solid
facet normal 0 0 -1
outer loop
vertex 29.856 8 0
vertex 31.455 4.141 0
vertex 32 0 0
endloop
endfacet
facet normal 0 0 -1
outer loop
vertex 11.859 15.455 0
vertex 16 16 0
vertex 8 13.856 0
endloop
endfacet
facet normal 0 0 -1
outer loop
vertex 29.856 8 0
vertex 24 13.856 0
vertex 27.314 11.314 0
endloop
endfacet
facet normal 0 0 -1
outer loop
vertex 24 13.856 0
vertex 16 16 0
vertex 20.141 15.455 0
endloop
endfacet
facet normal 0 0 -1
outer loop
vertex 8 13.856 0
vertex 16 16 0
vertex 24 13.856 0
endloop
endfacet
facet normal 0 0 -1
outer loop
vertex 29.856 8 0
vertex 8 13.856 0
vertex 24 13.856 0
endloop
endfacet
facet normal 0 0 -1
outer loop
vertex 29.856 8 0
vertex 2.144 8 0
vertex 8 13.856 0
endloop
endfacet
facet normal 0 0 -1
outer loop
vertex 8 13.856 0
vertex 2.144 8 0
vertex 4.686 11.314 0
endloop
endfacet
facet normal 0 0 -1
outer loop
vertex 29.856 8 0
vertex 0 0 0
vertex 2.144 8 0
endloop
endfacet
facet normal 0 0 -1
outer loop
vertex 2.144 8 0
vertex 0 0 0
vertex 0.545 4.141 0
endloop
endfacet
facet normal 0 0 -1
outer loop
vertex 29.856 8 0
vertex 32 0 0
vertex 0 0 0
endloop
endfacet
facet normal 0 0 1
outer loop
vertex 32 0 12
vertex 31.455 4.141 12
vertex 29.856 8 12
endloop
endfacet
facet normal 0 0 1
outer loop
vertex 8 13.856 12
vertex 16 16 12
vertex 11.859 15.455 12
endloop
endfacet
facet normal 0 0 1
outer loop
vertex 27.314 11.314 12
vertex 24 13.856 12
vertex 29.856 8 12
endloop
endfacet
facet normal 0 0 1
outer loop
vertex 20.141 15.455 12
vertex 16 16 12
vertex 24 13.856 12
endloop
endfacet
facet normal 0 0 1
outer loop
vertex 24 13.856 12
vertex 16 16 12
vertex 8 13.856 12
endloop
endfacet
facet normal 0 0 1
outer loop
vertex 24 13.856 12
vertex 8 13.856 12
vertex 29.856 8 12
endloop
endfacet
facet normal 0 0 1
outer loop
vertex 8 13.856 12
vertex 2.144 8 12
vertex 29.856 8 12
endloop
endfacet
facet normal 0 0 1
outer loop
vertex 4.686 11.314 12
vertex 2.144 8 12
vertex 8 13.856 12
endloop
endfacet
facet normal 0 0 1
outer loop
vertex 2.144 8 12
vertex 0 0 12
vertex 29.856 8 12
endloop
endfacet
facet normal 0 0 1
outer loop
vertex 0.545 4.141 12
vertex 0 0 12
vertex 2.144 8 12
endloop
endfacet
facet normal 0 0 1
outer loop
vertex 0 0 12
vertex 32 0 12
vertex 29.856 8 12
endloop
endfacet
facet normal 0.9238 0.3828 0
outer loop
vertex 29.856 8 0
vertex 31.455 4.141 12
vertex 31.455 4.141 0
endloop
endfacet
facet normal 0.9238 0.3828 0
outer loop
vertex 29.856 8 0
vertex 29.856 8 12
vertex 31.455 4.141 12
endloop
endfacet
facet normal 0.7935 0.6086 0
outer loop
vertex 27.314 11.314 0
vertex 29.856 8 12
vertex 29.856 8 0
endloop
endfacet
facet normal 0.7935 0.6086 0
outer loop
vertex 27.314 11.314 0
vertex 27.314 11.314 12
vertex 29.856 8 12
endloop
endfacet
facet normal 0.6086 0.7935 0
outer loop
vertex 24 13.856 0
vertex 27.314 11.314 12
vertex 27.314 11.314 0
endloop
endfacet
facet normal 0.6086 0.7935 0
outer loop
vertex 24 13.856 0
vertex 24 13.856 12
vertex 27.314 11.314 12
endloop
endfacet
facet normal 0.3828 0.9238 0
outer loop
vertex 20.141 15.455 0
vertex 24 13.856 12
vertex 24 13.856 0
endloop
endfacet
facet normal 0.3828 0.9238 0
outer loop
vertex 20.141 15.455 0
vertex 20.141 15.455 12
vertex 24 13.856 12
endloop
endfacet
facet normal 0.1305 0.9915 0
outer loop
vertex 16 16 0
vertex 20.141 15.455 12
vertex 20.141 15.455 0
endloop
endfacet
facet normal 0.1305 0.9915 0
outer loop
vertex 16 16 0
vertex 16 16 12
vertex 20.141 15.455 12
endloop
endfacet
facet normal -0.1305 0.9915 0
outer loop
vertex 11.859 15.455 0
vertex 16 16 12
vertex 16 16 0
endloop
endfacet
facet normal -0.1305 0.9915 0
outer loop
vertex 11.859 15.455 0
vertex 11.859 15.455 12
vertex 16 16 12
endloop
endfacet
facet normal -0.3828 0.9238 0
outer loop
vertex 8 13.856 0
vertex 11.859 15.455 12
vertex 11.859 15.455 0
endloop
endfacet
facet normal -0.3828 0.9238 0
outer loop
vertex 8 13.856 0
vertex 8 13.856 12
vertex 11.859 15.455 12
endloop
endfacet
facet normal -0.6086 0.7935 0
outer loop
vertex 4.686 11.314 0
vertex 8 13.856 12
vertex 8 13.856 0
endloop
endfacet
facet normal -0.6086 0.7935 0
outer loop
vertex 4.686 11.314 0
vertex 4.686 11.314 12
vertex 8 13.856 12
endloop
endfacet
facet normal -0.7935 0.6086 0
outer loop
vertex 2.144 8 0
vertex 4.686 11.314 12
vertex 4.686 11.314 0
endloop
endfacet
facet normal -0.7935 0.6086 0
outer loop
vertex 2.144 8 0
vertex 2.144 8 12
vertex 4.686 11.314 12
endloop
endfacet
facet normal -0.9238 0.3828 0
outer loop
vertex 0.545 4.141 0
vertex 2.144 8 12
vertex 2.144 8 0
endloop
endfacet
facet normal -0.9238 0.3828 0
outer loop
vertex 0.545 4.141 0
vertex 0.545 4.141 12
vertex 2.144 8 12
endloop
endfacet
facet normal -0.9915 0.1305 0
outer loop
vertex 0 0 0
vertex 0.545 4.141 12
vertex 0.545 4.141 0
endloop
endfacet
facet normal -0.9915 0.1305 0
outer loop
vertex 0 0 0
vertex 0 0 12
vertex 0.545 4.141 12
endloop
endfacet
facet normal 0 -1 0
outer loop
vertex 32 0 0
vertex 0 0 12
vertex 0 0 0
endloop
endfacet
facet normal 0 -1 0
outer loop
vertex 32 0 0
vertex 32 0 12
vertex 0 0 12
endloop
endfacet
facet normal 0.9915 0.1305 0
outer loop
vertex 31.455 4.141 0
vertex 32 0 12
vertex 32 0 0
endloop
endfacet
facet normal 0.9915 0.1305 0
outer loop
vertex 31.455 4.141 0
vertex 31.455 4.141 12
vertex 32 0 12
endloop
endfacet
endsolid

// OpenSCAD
$fn = 32;

// ----------------------------------------------------------------------
// Key bar: woodruff key, 12 mm thick
// ----------------------------------------------------------------------

// --- parameters (mm) ---
profile_height = 12;      // extrusion height
profile_points = 13;      // points of the closed outline

profile = [[32, 0], [31.455, 4.141], [29.856, 8], [27.314, 11.314], [24, 13.856], [20.141, 15.455], [16, 16], [11.859, 15.455], [8, 13.856], [4.686, 11.314], [2.144, 8], [0.545, 4.141], [0, 0]];  // single closed polygon, 13 points, counter clockwise

// --- the one profile operation ---
linear_extrude(height = profile_height) polygon(points = profile);
